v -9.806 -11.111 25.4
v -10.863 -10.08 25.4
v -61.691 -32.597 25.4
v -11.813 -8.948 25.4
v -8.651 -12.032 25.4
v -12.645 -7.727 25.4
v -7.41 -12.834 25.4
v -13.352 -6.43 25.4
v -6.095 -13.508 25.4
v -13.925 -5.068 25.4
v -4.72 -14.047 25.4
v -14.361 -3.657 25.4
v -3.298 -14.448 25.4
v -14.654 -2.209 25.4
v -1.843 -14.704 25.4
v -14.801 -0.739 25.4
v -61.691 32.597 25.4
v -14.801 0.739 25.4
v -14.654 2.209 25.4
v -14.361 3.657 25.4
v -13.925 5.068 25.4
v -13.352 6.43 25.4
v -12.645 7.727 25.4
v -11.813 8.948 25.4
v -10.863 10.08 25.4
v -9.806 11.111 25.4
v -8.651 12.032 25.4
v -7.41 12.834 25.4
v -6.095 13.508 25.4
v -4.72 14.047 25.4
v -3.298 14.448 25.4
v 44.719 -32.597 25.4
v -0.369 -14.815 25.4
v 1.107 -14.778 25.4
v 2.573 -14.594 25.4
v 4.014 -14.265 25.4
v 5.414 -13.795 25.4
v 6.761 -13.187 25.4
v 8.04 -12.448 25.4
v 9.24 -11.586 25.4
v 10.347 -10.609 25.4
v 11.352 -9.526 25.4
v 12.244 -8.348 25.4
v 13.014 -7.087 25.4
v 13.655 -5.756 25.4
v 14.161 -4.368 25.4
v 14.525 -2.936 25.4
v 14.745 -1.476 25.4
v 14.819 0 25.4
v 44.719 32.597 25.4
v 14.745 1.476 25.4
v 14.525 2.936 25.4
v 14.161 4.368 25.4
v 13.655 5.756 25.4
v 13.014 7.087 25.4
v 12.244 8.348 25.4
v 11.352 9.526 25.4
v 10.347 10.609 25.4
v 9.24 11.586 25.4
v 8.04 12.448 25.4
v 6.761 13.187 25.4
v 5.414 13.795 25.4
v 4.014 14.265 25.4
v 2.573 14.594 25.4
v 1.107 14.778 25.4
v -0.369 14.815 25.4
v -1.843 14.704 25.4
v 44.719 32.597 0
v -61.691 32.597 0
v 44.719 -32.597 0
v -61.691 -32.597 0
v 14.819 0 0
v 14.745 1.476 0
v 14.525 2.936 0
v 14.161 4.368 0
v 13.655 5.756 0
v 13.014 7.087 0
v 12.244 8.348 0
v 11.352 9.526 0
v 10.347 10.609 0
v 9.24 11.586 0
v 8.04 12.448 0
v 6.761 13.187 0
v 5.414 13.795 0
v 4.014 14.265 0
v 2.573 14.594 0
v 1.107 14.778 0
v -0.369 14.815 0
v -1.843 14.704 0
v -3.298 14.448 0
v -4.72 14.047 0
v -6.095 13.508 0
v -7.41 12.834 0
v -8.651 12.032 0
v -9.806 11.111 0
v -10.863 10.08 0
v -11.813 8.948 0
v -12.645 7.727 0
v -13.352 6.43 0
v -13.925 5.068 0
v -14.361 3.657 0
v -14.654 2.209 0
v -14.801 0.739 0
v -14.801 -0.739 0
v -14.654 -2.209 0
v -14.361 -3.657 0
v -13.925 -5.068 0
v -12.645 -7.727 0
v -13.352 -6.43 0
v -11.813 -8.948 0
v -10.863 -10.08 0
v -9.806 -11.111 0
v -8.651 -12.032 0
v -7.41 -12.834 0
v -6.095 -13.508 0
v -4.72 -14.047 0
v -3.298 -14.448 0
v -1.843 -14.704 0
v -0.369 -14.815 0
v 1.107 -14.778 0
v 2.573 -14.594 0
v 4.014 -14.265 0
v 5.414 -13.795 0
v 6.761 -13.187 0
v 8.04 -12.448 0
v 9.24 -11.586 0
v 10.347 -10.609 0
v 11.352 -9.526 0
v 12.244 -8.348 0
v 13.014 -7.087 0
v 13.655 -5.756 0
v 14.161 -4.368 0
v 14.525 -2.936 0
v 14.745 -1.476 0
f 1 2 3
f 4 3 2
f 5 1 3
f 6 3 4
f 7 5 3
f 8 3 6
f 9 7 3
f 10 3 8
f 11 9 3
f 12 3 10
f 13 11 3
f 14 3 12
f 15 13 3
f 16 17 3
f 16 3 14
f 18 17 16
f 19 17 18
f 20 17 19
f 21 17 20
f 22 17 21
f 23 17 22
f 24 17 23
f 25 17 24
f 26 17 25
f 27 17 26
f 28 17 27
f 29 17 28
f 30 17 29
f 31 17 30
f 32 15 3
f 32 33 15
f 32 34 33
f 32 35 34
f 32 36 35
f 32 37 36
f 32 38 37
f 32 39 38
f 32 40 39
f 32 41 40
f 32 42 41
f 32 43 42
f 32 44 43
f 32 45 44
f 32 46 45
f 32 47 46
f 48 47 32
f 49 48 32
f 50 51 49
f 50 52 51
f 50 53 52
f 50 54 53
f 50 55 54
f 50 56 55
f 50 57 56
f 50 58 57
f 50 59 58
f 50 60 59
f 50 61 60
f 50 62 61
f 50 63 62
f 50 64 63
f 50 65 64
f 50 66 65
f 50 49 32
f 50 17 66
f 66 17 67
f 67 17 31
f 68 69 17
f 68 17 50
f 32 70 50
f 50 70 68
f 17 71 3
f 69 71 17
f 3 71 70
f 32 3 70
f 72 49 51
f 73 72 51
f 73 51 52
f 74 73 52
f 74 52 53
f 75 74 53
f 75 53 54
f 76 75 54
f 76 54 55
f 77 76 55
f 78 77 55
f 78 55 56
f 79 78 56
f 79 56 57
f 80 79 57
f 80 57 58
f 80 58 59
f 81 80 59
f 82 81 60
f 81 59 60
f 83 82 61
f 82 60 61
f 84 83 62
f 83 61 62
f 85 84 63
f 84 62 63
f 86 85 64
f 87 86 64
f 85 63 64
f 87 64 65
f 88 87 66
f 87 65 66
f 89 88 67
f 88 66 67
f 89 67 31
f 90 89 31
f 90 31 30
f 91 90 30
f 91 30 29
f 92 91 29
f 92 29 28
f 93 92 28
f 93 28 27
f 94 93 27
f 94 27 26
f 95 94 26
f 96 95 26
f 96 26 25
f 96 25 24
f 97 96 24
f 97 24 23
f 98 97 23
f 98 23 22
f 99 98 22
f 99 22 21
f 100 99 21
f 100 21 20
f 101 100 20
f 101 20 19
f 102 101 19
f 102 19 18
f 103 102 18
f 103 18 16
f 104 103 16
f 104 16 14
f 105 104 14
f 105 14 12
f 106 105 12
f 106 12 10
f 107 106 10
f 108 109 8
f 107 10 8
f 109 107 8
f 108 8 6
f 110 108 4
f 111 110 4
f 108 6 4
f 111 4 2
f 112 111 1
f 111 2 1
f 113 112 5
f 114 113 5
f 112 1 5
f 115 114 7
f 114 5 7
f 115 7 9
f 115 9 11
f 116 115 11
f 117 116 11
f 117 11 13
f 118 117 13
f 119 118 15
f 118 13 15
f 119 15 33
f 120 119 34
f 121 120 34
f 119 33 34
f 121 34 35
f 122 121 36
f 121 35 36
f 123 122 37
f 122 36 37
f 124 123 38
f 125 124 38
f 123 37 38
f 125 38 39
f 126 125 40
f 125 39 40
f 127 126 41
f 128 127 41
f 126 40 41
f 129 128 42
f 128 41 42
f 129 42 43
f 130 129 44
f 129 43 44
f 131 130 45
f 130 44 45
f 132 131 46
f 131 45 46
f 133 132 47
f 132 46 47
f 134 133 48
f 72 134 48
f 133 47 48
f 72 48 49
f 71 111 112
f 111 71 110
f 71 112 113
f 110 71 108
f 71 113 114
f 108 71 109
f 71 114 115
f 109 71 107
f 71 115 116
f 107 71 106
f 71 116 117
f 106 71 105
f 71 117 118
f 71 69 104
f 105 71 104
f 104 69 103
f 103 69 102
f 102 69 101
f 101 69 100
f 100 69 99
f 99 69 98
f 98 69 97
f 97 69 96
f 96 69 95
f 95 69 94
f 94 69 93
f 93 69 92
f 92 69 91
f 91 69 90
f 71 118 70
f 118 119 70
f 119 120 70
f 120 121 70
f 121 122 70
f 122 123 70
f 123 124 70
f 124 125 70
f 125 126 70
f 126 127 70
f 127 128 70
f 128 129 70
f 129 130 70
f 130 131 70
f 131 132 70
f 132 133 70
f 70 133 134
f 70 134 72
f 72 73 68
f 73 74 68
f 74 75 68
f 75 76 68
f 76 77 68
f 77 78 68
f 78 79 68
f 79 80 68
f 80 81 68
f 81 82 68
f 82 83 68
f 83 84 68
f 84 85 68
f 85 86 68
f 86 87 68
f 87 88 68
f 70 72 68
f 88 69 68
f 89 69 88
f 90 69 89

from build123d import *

# Parameters (mm, degrees)
F0_W     = 106.410607
F0_H     = 65.193332
F1_DEPTH = 25.4
F2_R     = 14.819115
F3_DEPTH = 125.476


with BuildPart() as f1:
    # F0 (on Top) → F1 (new body)
    with BuildSketch(Plane.XY):
        with Locations((-8.485909, 0)):
            Rectangle(F0_W, F0_H)
    extrude(amount=F1_DEPTH)

    # F2 (on face) → F3 (cut)
    with BuildSketch(Plane.XY.offset(25.4)):
        Circle(F2_R)
    extrude(amount=-F3_DEPTH, mode=Mode.SUBTRACT)


solid = f1.part
